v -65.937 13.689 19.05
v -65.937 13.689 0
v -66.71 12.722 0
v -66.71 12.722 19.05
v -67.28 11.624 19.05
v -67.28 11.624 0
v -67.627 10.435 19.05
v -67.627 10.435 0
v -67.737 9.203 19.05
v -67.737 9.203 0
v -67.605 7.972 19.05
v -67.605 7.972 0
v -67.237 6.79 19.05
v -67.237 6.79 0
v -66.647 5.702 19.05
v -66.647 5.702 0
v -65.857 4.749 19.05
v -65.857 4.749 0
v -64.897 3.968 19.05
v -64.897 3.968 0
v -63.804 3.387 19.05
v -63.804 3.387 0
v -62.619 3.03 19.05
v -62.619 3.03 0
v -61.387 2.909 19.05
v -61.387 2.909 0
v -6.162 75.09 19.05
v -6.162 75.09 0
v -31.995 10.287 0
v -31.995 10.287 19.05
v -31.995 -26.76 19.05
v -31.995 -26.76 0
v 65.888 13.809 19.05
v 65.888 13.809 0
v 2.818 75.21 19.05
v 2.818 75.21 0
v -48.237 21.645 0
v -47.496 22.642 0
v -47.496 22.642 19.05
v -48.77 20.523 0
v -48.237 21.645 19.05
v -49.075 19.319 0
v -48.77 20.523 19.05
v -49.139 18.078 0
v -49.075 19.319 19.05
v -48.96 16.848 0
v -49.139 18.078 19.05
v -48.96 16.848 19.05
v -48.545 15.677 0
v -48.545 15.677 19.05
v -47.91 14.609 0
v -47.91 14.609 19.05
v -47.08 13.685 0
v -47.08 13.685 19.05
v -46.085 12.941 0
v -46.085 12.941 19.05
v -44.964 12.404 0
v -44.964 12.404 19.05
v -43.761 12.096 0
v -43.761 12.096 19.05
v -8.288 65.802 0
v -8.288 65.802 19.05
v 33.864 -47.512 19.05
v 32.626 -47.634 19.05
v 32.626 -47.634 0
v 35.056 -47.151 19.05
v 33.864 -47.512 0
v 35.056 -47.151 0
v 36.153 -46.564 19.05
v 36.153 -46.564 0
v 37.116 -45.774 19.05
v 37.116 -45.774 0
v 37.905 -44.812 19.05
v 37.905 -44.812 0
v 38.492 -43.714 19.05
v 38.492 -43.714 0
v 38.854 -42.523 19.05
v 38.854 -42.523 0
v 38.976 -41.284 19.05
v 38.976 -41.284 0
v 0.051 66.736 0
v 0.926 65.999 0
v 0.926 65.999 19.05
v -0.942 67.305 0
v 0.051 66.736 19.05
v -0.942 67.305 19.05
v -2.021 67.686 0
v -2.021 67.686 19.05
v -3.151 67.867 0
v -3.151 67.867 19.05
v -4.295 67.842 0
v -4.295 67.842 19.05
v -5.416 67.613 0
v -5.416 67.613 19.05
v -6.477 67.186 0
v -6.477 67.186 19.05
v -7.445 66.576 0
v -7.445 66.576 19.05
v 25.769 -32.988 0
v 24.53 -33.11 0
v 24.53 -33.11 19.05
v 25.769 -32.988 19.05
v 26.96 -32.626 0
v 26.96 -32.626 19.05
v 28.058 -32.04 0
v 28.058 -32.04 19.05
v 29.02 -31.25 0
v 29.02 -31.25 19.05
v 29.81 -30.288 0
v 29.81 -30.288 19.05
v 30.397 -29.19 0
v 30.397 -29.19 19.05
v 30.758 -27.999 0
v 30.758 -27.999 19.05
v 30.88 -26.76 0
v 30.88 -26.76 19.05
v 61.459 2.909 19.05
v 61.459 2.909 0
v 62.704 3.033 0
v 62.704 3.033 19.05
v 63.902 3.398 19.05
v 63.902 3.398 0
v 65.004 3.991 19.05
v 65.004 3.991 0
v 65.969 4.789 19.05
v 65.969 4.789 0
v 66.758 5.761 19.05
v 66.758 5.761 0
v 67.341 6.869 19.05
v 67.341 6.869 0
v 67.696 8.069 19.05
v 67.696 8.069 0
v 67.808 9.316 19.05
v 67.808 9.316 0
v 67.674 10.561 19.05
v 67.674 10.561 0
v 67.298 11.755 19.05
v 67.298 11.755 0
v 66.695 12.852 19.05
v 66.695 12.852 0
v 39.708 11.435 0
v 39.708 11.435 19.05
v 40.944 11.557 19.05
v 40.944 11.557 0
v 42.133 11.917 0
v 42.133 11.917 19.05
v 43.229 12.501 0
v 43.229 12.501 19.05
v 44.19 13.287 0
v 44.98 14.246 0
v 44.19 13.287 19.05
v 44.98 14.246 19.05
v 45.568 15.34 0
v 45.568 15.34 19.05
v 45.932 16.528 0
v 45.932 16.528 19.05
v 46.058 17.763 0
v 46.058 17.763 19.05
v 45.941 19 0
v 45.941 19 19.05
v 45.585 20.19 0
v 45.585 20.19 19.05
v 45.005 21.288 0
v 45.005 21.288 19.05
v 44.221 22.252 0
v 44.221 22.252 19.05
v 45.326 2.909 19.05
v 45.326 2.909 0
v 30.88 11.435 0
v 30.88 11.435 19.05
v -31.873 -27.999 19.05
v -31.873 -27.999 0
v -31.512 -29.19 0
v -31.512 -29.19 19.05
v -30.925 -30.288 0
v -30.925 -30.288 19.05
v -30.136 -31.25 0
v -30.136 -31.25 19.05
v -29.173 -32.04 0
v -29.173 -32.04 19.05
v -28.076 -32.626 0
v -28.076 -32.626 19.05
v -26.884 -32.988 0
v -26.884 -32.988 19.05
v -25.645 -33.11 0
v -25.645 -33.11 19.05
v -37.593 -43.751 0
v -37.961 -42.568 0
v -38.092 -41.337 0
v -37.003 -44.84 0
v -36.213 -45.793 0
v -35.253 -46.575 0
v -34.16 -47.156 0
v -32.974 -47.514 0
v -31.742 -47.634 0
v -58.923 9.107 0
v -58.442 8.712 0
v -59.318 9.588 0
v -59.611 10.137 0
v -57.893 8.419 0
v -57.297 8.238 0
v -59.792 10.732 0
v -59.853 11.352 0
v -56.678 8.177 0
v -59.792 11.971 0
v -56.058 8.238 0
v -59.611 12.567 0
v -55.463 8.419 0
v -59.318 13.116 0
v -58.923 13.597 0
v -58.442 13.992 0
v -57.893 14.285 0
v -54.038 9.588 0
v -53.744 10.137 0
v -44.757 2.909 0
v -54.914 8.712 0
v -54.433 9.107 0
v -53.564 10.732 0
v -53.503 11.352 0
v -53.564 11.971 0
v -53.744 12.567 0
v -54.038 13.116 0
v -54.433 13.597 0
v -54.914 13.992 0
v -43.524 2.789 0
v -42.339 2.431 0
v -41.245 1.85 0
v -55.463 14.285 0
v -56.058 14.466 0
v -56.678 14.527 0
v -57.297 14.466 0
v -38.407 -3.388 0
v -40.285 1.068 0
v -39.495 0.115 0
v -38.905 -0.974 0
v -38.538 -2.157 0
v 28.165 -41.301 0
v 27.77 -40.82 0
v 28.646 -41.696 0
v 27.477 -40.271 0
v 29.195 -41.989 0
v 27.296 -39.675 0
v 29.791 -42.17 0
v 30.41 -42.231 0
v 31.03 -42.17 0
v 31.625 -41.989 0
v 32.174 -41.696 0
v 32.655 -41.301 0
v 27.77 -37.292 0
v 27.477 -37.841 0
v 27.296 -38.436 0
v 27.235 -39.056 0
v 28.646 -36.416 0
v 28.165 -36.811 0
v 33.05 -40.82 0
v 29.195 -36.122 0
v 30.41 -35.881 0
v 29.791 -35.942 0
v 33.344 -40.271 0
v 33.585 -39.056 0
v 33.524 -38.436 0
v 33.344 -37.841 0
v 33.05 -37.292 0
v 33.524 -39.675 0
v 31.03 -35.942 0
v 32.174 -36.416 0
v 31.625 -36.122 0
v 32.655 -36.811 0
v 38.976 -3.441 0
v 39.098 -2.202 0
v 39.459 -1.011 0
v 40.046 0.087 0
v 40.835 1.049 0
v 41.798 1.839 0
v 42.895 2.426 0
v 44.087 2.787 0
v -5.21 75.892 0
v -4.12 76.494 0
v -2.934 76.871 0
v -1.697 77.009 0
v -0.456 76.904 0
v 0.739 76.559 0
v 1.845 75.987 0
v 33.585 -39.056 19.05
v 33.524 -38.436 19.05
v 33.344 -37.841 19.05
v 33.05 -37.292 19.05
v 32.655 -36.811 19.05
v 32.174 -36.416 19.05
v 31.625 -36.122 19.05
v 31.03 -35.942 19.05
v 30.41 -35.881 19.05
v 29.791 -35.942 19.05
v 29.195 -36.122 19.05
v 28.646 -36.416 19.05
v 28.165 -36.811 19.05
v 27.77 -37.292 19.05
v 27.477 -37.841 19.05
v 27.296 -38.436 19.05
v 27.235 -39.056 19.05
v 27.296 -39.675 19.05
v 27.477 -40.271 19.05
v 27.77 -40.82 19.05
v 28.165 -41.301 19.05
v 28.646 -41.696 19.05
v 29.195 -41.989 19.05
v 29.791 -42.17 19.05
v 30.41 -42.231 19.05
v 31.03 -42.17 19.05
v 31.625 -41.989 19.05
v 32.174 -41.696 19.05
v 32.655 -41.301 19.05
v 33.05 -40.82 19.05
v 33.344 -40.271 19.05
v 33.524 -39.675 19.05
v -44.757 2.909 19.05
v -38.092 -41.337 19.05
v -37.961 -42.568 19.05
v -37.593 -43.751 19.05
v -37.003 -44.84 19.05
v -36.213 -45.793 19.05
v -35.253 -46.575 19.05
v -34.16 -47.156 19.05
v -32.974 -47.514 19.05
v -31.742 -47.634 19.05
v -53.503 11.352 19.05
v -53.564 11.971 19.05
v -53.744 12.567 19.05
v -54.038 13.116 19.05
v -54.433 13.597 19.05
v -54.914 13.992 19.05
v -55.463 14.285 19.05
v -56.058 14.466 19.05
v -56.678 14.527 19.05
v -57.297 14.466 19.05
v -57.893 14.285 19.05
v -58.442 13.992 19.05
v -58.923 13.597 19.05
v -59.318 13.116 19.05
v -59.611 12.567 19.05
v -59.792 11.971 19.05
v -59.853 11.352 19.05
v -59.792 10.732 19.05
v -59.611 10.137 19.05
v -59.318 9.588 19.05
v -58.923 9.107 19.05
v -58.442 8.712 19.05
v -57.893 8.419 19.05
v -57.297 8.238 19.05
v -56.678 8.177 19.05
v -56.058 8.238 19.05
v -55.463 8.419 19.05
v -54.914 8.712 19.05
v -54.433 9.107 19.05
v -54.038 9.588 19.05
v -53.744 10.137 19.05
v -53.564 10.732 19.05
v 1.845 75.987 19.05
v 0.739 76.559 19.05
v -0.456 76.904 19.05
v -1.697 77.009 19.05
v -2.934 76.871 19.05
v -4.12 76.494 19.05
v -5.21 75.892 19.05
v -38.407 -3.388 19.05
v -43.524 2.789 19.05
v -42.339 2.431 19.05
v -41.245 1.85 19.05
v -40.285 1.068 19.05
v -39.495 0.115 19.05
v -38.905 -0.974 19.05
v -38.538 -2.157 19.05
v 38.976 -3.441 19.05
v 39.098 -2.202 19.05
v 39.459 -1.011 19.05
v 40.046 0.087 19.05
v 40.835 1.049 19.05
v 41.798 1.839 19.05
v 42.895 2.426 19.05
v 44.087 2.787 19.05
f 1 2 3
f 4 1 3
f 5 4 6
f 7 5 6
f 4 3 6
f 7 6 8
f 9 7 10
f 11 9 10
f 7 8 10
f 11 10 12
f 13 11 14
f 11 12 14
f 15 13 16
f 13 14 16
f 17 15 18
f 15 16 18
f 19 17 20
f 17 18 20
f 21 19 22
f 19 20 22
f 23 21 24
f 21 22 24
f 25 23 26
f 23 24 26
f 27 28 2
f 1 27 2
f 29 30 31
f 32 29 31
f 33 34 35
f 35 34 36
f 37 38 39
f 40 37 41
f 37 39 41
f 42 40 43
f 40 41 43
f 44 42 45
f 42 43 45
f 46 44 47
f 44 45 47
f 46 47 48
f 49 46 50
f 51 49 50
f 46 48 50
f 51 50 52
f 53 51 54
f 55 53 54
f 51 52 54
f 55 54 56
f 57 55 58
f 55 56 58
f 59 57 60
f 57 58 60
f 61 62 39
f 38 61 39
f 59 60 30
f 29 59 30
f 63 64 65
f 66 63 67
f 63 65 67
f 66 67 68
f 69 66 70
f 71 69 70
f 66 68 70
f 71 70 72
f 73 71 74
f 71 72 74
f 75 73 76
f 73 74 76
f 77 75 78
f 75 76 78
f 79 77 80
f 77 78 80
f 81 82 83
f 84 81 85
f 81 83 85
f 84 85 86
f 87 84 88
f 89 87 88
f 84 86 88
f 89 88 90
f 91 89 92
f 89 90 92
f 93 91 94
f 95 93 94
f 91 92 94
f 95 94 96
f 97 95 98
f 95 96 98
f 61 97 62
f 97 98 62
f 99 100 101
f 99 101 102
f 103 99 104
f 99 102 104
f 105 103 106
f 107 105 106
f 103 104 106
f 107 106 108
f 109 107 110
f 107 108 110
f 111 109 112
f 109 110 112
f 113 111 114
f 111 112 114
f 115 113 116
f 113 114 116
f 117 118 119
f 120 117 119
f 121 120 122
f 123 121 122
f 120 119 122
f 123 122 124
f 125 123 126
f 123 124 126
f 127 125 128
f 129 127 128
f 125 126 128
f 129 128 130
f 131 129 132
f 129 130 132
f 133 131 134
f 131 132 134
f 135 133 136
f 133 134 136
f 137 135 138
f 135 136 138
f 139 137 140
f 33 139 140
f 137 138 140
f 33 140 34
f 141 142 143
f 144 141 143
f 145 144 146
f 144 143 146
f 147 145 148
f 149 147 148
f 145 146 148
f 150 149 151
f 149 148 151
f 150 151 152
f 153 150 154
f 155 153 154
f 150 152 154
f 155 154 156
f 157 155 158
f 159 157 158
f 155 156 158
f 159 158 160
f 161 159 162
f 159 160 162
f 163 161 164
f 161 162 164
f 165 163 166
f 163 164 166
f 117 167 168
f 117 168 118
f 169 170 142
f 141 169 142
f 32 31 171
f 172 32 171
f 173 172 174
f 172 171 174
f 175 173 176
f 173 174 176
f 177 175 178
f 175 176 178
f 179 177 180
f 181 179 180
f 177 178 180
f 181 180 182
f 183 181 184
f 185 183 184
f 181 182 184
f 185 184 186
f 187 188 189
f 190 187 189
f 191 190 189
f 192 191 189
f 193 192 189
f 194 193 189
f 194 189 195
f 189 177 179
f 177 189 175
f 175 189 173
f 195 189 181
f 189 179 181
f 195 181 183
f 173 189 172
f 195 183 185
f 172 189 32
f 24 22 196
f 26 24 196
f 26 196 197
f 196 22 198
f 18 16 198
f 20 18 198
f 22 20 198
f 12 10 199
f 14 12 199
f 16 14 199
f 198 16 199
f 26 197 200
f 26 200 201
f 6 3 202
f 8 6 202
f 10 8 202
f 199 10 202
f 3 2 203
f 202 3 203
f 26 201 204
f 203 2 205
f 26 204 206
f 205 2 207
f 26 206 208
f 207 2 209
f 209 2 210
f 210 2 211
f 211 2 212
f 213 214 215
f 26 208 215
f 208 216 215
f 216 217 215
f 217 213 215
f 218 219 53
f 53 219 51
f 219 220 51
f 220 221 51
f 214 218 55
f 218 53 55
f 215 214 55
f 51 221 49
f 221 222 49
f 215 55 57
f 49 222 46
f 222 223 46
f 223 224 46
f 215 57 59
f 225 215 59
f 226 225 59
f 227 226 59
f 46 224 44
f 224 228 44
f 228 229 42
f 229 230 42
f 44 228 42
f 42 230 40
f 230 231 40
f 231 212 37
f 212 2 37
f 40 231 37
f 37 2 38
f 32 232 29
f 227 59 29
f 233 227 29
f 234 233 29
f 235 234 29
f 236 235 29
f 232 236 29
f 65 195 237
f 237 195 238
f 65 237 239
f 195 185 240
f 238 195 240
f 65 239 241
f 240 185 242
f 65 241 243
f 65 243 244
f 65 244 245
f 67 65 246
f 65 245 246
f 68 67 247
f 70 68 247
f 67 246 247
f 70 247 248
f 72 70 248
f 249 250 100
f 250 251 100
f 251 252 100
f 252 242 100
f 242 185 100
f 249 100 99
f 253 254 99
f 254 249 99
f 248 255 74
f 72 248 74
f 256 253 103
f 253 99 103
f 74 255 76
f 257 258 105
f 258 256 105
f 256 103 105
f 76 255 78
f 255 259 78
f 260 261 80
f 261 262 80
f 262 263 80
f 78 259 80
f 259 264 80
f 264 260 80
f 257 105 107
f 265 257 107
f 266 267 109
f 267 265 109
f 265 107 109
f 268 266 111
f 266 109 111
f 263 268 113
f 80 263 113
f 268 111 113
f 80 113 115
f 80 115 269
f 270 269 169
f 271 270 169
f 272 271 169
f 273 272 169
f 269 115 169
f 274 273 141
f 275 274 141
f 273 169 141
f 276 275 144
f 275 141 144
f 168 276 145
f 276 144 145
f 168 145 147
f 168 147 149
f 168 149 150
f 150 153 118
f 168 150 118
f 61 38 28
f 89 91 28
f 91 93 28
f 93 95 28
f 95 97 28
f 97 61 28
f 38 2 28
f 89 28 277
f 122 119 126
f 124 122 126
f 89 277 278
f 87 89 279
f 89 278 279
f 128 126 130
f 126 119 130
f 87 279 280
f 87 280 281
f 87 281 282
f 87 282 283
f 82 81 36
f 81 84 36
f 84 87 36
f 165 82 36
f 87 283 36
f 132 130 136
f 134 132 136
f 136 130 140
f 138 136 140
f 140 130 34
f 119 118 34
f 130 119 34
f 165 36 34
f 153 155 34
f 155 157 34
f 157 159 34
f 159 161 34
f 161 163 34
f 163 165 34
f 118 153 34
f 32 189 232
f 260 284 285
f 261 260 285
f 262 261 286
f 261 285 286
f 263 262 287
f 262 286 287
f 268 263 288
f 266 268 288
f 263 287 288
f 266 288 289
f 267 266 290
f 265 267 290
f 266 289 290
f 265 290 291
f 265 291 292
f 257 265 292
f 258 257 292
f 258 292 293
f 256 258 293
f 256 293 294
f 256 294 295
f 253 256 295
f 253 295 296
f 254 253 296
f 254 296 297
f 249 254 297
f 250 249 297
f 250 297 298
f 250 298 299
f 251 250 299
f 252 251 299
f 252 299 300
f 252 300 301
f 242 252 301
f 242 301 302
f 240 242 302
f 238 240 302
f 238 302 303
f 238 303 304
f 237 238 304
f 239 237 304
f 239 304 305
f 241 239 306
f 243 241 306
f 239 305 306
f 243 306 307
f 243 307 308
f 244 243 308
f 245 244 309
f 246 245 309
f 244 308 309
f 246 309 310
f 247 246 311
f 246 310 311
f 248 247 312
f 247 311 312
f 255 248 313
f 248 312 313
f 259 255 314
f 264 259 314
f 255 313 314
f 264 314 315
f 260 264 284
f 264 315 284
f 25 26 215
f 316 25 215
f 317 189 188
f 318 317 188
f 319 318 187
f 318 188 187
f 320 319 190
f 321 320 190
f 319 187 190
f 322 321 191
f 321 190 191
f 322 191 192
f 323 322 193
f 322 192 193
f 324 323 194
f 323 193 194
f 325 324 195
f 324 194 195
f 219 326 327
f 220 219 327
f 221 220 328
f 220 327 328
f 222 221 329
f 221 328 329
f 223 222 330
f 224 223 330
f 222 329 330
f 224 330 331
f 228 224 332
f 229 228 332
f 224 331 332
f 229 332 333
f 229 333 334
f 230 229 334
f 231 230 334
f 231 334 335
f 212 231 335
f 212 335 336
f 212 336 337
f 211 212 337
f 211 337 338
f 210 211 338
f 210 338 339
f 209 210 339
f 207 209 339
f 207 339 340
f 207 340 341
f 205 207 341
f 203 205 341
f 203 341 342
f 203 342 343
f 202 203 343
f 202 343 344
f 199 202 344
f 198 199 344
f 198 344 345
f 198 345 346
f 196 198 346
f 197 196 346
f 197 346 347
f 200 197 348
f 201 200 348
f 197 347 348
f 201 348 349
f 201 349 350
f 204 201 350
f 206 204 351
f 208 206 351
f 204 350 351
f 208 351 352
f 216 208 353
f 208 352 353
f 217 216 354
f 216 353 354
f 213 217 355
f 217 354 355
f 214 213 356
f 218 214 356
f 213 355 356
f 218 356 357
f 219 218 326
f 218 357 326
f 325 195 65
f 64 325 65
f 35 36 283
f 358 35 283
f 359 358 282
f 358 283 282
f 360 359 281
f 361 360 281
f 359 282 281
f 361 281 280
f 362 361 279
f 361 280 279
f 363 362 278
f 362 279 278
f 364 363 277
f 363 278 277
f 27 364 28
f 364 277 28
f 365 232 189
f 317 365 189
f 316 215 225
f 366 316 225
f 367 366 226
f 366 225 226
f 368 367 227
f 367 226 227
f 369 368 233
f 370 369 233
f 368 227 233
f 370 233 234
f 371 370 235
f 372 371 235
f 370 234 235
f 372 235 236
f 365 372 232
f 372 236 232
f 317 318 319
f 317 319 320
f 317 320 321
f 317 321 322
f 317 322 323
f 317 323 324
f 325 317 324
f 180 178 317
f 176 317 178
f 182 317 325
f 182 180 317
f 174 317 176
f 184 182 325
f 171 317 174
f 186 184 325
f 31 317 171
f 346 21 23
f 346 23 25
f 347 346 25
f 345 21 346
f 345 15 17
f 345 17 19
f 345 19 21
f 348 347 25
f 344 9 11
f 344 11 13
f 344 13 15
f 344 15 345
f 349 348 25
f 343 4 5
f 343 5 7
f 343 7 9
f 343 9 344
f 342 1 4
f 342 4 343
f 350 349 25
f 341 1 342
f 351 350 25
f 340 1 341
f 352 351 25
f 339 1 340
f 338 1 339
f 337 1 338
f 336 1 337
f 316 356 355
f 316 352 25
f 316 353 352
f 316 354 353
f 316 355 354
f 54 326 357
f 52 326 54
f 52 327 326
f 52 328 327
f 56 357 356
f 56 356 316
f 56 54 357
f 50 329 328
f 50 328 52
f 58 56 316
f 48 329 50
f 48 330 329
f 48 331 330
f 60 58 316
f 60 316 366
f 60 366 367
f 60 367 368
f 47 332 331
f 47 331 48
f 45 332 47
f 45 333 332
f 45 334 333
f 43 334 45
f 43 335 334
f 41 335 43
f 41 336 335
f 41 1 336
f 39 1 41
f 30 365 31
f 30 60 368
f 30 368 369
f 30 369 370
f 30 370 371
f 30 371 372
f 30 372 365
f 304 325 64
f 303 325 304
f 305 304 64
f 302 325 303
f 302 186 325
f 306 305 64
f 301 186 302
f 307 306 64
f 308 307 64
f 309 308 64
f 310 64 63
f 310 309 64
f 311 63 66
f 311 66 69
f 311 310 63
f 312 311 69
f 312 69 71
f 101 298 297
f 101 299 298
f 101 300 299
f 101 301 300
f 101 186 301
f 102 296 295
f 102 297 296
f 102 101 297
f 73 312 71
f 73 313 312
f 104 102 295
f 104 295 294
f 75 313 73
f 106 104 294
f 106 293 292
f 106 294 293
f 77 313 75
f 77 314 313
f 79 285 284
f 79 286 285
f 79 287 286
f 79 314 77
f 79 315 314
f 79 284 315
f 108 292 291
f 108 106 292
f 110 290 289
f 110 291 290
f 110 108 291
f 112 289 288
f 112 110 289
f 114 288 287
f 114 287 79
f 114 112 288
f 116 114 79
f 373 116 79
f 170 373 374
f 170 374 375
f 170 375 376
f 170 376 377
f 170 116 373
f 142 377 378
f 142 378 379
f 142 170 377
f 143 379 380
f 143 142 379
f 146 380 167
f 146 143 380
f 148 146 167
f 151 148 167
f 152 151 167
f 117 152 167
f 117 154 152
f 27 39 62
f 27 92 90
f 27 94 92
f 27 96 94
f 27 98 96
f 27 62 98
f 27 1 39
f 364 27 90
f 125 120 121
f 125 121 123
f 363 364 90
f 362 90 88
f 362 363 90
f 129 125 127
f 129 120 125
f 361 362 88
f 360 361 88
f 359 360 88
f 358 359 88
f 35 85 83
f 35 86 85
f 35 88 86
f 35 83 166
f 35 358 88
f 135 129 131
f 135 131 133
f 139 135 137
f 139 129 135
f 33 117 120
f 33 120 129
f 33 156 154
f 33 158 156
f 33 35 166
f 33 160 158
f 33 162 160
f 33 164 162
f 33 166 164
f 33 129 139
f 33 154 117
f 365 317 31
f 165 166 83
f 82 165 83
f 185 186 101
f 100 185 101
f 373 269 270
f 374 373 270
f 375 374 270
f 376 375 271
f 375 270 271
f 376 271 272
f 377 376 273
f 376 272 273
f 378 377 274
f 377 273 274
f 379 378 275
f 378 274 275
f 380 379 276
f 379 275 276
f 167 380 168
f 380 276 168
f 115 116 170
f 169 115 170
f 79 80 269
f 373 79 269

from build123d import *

# Parameters (mm, degrees)
F1_DEPTH = 19.05
F3_R     = 3.175
F4_DEPTH = 19.051
F6_DEPTH = 19.051


with BuildPart() as f1:
    # F0 (on Top) → F1 (new body)
    with BuildSketch(Plane.XY):
        with BuildLine():
            ThreePointArc((38.975515, -3.440669), (40.835387, 1.049459), (45.325515, 2.909331))
            Line((45.325515, 2.909331), (61.458508, 2.909331))
            ThreePointArc((61.458508, 2.909331), (67.341307, 6.868686), (65.888014, 13.809274))
            Line((65.888014, 13.809274), (2.81784, 75.209965))
            ThreePointArc((2.81784, 75.209965), (-1.696828, 77.009451), (-6.161608, 75.089527))
            Line((-6.161608, 75.089527), (-65.937009, 13.688836))
            ThreePointArc((-65.937009, 13.688836), (-67.237273, 6.790005), (-61.387065, 2.909331))
            Line((-61.387065, 2.909331), (-44.756616, 2.909331))
            ThreePointArc((-44.756616, 2.909331), (-40.285175, 1.068068), (-38.406835, -3.387924))
            Line((-38.406835, -3.387924), (-38.091605, -41.337081))
            ThreePointArc((-38.091605, -41.337081), (-36.213265, -45.793073), (-31.741824, -47.634335))
            Line((-31.741824, -47.634335), (32.625515, -47.634335))
            ThreePointArc((32.625515, -47.634335), (37.115643, -45.774463), (38.975515, -41.284335))
            Line((38.975515, -41.284335), (38.975515, -3.440669))
        make_face()
    extrude(amount=F1_DEPTH)

    # F3 (on face) → F4 (cut, through all)
    with BuildSketch(Plane.XY.offset(19.05)):
        with Locations((-56.677773, 11.351841)):
            Circle(F3_R)
        with Locations((30.4104, -39.055706)):
            Circle(F3_R)
    extrude(amount=-F4_DEPTH, mode=Mode.SUBTRACT)

    # F5 (on face) → F6 (cut, through all)
    with BuildSketch(Plane.XY.offset(19.05)):
        with BuildLine():
            Line((-8.287639, 65.80173), (-47.495655, 22.642287))
            ThreePointArc((-47.495655, 22.642287), (-48.781233, 16.252613), (-43.760738, 12.096261))
            Line((-43.760738, 12.096261), (-31.995475, 10.286895))
            Line((-31.995475, 10.286895), (-31.995475, -26.759769))
            ThreePointArc((-31.995475, -26.759769), (-30.135603, -31.249897), (-25.645475, -33.109769))
            Line((-25.645475, -33.109769), (24.530177, -33.109769))
            ThreePointArc((24.530177, -33.109769), (29.020305, -31.249897), (30.880177, -26.759769))
            Line((30.880177, -26.759769), (30.880177, 11.435365))
            Line((30.880177, 11.435365), (39.708046, 11.435365))
            ThreePointArc((39.708046, 11.435365), (45.568366, 15.340135), (44.221378, 22.252168))
            Line((44.221378, 22.252168), (0.925822, 65.998721))
            ThreePointArc((0.925822, 65.998721), (-3.723247, 67.880467), (-8.287639, 65.80173))
        make_face()
    extrude(amount=-F6_DEPTH, mode=Mode.SUBTRACT)


solid = f1.part
